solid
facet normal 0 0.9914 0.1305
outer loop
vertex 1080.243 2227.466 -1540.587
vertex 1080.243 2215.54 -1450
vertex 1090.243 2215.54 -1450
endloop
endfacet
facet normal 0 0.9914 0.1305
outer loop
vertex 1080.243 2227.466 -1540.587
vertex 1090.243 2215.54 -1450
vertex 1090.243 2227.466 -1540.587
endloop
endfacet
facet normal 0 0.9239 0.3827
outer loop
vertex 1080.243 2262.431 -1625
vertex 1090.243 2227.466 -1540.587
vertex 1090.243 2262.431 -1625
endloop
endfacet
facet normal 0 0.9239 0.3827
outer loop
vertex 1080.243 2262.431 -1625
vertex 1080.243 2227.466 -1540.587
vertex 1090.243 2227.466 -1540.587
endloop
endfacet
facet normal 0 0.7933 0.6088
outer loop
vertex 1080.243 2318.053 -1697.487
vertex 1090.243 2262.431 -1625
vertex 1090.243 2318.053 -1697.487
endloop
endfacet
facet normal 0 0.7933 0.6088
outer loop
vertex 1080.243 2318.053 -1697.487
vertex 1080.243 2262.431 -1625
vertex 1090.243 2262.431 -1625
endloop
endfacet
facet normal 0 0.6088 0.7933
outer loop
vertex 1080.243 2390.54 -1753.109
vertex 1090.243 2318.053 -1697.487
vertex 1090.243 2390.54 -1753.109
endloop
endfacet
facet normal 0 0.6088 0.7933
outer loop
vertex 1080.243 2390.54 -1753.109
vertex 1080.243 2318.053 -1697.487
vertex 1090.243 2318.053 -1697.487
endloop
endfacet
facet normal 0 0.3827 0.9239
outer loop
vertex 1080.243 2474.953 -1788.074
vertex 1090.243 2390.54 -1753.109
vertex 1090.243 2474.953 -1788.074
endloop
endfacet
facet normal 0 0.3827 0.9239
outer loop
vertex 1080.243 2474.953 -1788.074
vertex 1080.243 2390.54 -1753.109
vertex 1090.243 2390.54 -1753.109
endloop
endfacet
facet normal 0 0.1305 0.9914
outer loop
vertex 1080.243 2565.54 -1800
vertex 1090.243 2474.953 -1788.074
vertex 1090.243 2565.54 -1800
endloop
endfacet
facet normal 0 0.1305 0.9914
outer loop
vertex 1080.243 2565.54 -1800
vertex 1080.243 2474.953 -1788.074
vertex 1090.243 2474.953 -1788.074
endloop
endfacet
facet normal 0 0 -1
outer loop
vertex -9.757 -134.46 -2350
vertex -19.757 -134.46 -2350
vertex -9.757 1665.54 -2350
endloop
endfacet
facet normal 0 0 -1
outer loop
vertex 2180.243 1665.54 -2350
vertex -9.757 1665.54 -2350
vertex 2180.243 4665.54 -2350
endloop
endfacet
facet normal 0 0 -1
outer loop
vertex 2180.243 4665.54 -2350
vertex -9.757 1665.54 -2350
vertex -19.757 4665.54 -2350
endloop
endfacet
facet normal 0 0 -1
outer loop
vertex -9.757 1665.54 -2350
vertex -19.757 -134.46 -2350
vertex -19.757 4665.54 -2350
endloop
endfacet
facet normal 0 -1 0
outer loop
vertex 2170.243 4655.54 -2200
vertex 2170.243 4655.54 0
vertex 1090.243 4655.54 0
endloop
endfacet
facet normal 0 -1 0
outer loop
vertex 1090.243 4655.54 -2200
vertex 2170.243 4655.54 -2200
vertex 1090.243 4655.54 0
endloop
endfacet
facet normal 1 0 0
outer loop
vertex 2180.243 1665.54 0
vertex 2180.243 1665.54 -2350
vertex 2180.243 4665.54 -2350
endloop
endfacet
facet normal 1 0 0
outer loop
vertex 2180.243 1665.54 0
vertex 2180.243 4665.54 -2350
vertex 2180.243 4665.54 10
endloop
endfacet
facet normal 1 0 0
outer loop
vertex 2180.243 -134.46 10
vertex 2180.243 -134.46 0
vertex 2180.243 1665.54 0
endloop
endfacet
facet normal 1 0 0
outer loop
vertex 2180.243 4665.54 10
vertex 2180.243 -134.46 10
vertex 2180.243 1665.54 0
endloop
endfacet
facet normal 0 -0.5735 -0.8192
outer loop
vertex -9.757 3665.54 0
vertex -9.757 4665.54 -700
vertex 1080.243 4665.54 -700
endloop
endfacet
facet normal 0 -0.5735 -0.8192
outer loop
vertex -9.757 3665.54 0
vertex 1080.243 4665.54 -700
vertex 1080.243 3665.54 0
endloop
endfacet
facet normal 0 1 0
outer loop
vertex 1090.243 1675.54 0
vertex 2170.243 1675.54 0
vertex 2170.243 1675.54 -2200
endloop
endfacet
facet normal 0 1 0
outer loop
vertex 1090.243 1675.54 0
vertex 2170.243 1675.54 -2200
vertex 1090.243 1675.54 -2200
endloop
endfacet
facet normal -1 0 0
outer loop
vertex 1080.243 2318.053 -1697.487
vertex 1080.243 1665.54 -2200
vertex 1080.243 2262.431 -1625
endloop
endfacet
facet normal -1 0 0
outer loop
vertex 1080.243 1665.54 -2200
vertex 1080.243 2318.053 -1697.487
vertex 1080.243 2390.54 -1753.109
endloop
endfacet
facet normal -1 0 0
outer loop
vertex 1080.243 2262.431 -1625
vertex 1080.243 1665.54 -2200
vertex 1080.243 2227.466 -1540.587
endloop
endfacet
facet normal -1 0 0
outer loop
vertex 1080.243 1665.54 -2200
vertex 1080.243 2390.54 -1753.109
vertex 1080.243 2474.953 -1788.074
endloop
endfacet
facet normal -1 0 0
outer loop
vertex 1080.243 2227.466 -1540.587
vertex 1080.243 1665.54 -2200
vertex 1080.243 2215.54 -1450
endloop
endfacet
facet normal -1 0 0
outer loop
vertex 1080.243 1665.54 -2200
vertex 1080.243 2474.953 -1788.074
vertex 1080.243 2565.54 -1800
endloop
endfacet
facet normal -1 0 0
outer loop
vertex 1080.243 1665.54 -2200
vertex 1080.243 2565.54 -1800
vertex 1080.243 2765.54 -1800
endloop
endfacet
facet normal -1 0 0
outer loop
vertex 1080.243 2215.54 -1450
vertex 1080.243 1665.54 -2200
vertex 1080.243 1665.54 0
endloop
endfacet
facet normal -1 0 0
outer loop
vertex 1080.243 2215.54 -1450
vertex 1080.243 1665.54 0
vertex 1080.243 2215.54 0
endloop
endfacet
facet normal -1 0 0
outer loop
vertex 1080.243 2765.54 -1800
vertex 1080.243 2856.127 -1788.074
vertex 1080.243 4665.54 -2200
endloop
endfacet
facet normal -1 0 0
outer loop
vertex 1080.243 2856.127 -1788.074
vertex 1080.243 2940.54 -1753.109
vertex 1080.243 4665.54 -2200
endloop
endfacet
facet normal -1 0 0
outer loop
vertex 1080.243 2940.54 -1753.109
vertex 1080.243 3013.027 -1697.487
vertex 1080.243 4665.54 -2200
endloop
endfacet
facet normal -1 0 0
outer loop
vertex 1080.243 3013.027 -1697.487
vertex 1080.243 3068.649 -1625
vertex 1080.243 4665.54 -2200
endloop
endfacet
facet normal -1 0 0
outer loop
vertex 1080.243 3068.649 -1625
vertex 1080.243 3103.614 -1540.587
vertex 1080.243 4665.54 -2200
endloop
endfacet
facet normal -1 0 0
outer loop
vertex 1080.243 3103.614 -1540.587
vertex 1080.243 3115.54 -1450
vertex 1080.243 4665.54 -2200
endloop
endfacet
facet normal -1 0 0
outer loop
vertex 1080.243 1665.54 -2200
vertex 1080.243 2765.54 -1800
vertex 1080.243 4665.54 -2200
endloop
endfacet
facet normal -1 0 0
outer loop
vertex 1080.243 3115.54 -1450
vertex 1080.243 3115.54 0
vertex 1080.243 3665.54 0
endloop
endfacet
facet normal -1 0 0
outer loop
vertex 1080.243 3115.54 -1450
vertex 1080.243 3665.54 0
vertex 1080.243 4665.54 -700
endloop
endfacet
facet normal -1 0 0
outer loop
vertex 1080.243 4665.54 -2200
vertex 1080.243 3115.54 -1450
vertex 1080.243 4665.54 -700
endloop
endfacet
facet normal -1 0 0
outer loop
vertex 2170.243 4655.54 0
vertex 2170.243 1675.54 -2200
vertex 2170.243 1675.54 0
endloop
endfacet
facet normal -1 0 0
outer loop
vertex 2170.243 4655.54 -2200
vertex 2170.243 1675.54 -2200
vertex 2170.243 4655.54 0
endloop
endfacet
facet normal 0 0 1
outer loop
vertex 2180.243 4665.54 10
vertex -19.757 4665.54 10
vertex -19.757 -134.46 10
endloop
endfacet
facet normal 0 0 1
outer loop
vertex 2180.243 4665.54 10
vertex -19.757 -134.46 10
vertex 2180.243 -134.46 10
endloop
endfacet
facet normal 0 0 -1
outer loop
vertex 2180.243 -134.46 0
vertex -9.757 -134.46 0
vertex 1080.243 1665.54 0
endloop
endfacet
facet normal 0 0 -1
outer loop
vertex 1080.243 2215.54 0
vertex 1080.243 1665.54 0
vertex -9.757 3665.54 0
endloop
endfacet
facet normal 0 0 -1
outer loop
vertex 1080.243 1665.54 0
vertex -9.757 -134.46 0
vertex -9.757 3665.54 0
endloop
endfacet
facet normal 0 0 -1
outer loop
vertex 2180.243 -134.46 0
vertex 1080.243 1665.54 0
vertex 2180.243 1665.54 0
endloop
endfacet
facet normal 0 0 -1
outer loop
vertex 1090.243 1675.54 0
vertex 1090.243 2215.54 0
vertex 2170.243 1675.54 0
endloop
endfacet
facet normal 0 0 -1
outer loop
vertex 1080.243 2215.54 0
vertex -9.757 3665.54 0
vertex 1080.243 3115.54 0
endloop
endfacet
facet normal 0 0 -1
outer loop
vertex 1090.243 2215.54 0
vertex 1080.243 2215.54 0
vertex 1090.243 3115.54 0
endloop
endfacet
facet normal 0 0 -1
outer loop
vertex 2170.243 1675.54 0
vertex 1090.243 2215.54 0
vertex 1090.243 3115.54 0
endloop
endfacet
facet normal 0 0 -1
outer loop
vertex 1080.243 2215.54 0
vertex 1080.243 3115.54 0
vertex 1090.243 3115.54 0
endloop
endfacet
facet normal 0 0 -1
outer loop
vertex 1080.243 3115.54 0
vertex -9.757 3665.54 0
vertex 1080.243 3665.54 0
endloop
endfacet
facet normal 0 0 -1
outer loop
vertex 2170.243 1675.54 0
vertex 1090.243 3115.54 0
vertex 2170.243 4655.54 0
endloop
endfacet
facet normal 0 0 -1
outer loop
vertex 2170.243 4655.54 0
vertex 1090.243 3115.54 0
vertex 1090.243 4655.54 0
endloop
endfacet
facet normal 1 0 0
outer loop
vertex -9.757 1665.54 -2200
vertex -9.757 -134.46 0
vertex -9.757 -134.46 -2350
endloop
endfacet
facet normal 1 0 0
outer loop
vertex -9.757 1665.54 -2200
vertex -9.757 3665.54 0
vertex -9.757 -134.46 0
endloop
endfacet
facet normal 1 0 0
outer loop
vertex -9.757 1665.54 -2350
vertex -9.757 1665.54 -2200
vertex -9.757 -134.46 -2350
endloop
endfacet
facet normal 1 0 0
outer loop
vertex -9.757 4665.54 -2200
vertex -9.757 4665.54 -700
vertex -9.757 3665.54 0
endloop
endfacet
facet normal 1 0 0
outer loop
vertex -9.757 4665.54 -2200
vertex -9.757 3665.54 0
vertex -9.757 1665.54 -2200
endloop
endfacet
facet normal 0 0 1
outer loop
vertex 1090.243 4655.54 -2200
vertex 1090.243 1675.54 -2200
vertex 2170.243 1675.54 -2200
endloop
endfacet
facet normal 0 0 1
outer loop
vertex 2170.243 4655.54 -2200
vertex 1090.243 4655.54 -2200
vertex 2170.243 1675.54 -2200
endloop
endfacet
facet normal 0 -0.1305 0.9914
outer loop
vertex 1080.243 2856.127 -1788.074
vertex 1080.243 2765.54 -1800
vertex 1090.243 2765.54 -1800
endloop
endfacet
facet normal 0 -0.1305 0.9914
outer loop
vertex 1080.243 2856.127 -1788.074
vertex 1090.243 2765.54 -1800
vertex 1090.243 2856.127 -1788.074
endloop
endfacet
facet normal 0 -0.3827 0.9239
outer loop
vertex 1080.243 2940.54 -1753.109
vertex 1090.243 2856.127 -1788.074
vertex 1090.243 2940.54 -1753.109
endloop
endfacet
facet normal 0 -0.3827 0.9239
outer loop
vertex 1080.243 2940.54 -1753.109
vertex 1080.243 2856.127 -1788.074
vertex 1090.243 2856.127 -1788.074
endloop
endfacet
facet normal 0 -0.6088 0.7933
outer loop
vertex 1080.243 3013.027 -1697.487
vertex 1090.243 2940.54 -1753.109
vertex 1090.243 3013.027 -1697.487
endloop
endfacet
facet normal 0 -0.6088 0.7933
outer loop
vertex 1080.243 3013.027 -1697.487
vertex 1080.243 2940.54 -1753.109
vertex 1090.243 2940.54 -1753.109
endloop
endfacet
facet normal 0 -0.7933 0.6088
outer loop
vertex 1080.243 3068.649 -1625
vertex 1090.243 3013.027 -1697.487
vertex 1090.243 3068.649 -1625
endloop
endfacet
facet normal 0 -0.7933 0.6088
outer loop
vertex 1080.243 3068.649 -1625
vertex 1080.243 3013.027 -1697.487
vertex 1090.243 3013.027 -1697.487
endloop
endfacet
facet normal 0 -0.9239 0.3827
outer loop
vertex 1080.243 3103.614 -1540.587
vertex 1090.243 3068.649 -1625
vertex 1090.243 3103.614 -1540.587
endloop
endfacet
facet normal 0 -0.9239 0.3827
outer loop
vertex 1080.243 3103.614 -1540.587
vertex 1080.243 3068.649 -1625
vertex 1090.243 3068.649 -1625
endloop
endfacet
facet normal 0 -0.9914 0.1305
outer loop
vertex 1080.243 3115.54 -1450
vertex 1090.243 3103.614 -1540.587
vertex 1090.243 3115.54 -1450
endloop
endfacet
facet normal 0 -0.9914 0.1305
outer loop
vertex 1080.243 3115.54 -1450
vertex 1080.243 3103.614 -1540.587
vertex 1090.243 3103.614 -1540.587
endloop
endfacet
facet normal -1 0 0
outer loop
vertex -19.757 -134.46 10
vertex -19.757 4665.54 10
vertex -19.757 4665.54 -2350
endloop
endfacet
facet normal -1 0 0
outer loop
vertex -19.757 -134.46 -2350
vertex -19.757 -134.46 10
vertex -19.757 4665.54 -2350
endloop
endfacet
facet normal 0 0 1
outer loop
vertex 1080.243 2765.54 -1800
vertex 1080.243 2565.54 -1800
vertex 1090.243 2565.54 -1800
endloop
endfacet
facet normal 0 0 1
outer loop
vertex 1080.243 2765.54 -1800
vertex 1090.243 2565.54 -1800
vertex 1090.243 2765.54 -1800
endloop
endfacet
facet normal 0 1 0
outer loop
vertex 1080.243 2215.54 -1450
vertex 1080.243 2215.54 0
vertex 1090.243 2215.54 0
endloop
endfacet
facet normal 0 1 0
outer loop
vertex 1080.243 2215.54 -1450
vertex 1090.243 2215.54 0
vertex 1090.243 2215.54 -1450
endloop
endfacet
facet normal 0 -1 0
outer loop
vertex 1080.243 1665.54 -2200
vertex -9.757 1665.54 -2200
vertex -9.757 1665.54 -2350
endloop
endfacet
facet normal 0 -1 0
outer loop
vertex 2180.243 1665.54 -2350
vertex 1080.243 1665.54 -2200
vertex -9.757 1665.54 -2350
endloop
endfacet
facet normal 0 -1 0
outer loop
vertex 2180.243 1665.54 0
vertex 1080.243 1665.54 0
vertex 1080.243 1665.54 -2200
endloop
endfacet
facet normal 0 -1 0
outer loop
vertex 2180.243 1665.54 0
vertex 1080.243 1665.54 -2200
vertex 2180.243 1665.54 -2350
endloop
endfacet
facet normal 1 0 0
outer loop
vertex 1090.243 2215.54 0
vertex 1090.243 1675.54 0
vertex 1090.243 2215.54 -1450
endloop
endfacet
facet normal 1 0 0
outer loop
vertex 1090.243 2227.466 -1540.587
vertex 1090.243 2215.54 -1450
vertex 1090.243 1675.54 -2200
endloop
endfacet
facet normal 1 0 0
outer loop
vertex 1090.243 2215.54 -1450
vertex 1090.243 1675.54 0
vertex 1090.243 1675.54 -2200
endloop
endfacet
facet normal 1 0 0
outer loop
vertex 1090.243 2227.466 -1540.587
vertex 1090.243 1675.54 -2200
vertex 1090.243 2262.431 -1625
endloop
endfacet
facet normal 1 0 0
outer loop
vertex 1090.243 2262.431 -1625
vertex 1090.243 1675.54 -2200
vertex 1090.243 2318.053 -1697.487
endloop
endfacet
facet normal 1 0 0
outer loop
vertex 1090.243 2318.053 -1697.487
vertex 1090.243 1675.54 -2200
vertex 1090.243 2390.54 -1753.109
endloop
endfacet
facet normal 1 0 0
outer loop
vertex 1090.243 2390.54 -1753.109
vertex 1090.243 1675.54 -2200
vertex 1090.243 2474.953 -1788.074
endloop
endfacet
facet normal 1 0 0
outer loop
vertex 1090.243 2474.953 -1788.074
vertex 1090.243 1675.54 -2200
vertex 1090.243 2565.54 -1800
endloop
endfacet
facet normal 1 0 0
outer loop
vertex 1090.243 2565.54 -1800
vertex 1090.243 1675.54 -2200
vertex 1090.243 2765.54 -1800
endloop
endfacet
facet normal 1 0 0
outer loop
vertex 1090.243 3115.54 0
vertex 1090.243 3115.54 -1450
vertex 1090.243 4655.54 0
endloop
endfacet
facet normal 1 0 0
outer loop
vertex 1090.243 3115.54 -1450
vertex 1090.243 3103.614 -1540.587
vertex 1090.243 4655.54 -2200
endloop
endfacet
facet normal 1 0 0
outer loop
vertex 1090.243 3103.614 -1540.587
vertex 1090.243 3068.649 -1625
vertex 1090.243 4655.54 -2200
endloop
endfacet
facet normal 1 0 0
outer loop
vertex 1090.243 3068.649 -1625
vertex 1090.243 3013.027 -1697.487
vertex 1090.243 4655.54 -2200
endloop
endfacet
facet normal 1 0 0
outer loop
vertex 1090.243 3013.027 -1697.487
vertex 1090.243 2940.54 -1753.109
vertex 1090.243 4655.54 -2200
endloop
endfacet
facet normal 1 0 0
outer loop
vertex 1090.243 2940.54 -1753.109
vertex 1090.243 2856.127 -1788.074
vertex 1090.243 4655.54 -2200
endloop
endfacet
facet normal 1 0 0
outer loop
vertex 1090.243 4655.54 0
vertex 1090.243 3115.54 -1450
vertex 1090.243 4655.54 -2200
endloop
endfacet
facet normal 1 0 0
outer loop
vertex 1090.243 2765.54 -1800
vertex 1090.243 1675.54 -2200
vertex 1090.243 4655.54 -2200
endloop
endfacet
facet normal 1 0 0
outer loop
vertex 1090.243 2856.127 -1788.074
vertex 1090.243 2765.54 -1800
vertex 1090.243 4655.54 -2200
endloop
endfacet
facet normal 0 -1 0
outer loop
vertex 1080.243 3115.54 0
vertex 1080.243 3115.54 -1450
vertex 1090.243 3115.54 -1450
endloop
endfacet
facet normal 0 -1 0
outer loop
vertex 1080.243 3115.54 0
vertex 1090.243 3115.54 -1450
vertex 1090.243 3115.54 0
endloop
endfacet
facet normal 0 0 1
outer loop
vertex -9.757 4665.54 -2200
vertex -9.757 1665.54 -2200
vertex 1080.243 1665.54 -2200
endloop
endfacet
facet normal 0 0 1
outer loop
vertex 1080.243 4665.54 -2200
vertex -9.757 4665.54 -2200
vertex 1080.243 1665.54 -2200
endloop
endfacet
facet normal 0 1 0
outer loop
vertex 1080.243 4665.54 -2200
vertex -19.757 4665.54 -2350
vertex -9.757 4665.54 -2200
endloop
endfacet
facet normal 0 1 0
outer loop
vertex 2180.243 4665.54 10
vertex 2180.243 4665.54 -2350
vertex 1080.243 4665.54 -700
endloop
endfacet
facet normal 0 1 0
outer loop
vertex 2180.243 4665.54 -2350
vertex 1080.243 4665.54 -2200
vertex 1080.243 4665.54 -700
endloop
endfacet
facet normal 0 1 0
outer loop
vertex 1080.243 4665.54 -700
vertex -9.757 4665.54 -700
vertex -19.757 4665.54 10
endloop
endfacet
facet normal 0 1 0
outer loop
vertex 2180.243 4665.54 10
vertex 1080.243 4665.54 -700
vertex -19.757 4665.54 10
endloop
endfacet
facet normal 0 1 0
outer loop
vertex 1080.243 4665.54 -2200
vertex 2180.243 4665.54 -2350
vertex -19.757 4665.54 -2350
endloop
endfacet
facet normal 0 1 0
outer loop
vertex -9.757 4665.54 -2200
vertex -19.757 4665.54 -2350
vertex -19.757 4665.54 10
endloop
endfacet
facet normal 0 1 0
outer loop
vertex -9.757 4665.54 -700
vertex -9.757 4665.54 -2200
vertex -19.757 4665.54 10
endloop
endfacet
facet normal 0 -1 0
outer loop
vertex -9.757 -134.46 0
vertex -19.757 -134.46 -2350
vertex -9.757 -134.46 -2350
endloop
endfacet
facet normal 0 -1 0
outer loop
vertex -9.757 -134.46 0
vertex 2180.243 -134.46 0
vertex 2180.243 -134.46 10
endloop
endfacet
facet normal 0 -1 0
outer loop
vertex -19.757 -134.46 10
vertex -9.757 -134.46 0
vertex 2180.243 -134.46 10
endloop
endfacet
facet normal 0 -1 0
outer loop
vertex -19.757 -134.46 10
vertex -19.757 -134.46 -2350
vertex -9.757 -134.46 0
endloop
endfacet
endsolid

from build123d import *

# Parameters (mm, degrees)
ESQUISSE1_W             = 2200
ESQUISSE1_H             = 4800
BOSS_EXTRU_1_DEPTH      = 10
BOSS_EXTRU_3_DEPTH      = 1100
ESQUISSE11_W            = 1100
ESQUISSE11_H            = 3000
BOSS_EXTRU_5_DEPTH      = 2200
ESQUISSE12_W            = 1080
ESQUISSE12_H            = 2980
ENL_V_MAT_EXTRU_1_DEPTH = 2200
ENL_V_MAT_EXTRU_2_REACH = 5276.207
ESQUISSE14_W            = 2200
ESQUISSE14_H            = 150
BOSS_EXTRU_12_DEPTH     = 3000
BOSS_EXTRU_13_DEPTH     = 10


with BuildPart() as part:
    # Esquisse1 → Boss.-Extru.1 (new body)
    with BuildSketch(Plane.XY):
        with Locations((1080.243264597, 2265.539904099)):
            Rectangle(ESQUISSE1_W, ESQUISSE1_H)
    extrude(amount=BOSS_EXTRU_1_DEPTH)

    # Esquisse3 → Boss.-Extru.3 (add)
    with BuildSketch(Plane.ZY.offset(19.756735403)):
        Polygon((0, 4665.539904099), (-700, 4665.539904099), (0, 3665.539904099), align=None)
    extrude(amount=-BOSS_EXTRU_3_DEPTH)

    # Esquisse11 → Boss.-Extru.5 (add)
    with BuildSketch(Plane(origin=(0, 0, 0), x_dir=(-1, 0, 0), z_dir=(0, 0, -1))):
        with Locations((-1630.243264597, 3165.539904099)):
            Rectangle(ESQUISSE11_W, ESQUISSE11_H)
    extrude(amount=BOSS_EXTRU_5_DEPTH)

    # Esquisse12 → Enlèv. mat.-Extru.1 (cut)
    with BuildSketch(Plane(origin=(0, 0, -2200), x_dir=(-1, 0, 0), z_dir=(0, 0, -1))):
        with Locations((-1630.243264597, 3165.539904099)):
            Rectangle(ESQUISSE12_W, ESQUISSE12_H)
    extrude(amount=-ENL_V_MAT_EXTRU_1_DEPTH, mode=Mode.SUBTRACT)

    # Esquisse13 → Enlèv. mat.-Extru.2 (cut, up to next)
    with BuildSketch(Plane.ZY.offset(-1080.243264597), mode=Mode.PRIVATE) as enl_v_mat_extru_2_sk1:
        with BuildLine():
            Line((0, 2215.539904099), (-1450, 2215.539904099))
            ThreePointArc((-1450, 2215.539904099), (-1697.487373415, 2318.052530684), (-1800, 2565.539904099))
            Line((-1800, 2565.539904099), (-1800, 2765.539904099))
            ThreePointArc((-1800, 2765.539904099), (-1697.487373415, 3013.027277514), (-1450, 3115.539904099))
            Line((-1450, 3115.539904099), (0, 3115.539904099))
            Line((0, 3115.539904099), (0, 2215.539904099))
        make_face()
    enl_v_mat_extru_2_tool1 = extrude(enl_v_mat_extru_2_sk1.sketch, amount=-ENL_V_MAT_EXTRU_2_REACH, mode=Mode.PRIVATE) & part.part
    add(enl_v_mat_extru_2_tool1.solids().sort_by_distance((1080.243265, 2665.539904, -872.432919))[0], mode=Mode.SUBTRACT)

    # Esquisse14 → Boss.-Extru.12 (add)
    with BuildSketch(Plane.XZ.offset(-1665.539904099)):
        with Locations((1080.243264597, -2275)):
            Rectangle(ESQUISSE14_W, ESQUISSE14_H)
    extrude(amount=-BOSS_EXTRU_12_DEPTH)

    # Esquisse16 → Boss.-Extru.13 (add)
    with BuildSketch(Plane.ZY.offset(19.756735403)):
        Polygon((0, -134.460095901), (-1538.867991766, -134.460095901), (-2350, -134.460095901), (-2350, 4665.539904099), (-700, 4665.539904099), (0, 3665.539904099), align=None)
    extrude(amount=-BOSS_EXTRU_13_DEPTH)


solid = part.part
